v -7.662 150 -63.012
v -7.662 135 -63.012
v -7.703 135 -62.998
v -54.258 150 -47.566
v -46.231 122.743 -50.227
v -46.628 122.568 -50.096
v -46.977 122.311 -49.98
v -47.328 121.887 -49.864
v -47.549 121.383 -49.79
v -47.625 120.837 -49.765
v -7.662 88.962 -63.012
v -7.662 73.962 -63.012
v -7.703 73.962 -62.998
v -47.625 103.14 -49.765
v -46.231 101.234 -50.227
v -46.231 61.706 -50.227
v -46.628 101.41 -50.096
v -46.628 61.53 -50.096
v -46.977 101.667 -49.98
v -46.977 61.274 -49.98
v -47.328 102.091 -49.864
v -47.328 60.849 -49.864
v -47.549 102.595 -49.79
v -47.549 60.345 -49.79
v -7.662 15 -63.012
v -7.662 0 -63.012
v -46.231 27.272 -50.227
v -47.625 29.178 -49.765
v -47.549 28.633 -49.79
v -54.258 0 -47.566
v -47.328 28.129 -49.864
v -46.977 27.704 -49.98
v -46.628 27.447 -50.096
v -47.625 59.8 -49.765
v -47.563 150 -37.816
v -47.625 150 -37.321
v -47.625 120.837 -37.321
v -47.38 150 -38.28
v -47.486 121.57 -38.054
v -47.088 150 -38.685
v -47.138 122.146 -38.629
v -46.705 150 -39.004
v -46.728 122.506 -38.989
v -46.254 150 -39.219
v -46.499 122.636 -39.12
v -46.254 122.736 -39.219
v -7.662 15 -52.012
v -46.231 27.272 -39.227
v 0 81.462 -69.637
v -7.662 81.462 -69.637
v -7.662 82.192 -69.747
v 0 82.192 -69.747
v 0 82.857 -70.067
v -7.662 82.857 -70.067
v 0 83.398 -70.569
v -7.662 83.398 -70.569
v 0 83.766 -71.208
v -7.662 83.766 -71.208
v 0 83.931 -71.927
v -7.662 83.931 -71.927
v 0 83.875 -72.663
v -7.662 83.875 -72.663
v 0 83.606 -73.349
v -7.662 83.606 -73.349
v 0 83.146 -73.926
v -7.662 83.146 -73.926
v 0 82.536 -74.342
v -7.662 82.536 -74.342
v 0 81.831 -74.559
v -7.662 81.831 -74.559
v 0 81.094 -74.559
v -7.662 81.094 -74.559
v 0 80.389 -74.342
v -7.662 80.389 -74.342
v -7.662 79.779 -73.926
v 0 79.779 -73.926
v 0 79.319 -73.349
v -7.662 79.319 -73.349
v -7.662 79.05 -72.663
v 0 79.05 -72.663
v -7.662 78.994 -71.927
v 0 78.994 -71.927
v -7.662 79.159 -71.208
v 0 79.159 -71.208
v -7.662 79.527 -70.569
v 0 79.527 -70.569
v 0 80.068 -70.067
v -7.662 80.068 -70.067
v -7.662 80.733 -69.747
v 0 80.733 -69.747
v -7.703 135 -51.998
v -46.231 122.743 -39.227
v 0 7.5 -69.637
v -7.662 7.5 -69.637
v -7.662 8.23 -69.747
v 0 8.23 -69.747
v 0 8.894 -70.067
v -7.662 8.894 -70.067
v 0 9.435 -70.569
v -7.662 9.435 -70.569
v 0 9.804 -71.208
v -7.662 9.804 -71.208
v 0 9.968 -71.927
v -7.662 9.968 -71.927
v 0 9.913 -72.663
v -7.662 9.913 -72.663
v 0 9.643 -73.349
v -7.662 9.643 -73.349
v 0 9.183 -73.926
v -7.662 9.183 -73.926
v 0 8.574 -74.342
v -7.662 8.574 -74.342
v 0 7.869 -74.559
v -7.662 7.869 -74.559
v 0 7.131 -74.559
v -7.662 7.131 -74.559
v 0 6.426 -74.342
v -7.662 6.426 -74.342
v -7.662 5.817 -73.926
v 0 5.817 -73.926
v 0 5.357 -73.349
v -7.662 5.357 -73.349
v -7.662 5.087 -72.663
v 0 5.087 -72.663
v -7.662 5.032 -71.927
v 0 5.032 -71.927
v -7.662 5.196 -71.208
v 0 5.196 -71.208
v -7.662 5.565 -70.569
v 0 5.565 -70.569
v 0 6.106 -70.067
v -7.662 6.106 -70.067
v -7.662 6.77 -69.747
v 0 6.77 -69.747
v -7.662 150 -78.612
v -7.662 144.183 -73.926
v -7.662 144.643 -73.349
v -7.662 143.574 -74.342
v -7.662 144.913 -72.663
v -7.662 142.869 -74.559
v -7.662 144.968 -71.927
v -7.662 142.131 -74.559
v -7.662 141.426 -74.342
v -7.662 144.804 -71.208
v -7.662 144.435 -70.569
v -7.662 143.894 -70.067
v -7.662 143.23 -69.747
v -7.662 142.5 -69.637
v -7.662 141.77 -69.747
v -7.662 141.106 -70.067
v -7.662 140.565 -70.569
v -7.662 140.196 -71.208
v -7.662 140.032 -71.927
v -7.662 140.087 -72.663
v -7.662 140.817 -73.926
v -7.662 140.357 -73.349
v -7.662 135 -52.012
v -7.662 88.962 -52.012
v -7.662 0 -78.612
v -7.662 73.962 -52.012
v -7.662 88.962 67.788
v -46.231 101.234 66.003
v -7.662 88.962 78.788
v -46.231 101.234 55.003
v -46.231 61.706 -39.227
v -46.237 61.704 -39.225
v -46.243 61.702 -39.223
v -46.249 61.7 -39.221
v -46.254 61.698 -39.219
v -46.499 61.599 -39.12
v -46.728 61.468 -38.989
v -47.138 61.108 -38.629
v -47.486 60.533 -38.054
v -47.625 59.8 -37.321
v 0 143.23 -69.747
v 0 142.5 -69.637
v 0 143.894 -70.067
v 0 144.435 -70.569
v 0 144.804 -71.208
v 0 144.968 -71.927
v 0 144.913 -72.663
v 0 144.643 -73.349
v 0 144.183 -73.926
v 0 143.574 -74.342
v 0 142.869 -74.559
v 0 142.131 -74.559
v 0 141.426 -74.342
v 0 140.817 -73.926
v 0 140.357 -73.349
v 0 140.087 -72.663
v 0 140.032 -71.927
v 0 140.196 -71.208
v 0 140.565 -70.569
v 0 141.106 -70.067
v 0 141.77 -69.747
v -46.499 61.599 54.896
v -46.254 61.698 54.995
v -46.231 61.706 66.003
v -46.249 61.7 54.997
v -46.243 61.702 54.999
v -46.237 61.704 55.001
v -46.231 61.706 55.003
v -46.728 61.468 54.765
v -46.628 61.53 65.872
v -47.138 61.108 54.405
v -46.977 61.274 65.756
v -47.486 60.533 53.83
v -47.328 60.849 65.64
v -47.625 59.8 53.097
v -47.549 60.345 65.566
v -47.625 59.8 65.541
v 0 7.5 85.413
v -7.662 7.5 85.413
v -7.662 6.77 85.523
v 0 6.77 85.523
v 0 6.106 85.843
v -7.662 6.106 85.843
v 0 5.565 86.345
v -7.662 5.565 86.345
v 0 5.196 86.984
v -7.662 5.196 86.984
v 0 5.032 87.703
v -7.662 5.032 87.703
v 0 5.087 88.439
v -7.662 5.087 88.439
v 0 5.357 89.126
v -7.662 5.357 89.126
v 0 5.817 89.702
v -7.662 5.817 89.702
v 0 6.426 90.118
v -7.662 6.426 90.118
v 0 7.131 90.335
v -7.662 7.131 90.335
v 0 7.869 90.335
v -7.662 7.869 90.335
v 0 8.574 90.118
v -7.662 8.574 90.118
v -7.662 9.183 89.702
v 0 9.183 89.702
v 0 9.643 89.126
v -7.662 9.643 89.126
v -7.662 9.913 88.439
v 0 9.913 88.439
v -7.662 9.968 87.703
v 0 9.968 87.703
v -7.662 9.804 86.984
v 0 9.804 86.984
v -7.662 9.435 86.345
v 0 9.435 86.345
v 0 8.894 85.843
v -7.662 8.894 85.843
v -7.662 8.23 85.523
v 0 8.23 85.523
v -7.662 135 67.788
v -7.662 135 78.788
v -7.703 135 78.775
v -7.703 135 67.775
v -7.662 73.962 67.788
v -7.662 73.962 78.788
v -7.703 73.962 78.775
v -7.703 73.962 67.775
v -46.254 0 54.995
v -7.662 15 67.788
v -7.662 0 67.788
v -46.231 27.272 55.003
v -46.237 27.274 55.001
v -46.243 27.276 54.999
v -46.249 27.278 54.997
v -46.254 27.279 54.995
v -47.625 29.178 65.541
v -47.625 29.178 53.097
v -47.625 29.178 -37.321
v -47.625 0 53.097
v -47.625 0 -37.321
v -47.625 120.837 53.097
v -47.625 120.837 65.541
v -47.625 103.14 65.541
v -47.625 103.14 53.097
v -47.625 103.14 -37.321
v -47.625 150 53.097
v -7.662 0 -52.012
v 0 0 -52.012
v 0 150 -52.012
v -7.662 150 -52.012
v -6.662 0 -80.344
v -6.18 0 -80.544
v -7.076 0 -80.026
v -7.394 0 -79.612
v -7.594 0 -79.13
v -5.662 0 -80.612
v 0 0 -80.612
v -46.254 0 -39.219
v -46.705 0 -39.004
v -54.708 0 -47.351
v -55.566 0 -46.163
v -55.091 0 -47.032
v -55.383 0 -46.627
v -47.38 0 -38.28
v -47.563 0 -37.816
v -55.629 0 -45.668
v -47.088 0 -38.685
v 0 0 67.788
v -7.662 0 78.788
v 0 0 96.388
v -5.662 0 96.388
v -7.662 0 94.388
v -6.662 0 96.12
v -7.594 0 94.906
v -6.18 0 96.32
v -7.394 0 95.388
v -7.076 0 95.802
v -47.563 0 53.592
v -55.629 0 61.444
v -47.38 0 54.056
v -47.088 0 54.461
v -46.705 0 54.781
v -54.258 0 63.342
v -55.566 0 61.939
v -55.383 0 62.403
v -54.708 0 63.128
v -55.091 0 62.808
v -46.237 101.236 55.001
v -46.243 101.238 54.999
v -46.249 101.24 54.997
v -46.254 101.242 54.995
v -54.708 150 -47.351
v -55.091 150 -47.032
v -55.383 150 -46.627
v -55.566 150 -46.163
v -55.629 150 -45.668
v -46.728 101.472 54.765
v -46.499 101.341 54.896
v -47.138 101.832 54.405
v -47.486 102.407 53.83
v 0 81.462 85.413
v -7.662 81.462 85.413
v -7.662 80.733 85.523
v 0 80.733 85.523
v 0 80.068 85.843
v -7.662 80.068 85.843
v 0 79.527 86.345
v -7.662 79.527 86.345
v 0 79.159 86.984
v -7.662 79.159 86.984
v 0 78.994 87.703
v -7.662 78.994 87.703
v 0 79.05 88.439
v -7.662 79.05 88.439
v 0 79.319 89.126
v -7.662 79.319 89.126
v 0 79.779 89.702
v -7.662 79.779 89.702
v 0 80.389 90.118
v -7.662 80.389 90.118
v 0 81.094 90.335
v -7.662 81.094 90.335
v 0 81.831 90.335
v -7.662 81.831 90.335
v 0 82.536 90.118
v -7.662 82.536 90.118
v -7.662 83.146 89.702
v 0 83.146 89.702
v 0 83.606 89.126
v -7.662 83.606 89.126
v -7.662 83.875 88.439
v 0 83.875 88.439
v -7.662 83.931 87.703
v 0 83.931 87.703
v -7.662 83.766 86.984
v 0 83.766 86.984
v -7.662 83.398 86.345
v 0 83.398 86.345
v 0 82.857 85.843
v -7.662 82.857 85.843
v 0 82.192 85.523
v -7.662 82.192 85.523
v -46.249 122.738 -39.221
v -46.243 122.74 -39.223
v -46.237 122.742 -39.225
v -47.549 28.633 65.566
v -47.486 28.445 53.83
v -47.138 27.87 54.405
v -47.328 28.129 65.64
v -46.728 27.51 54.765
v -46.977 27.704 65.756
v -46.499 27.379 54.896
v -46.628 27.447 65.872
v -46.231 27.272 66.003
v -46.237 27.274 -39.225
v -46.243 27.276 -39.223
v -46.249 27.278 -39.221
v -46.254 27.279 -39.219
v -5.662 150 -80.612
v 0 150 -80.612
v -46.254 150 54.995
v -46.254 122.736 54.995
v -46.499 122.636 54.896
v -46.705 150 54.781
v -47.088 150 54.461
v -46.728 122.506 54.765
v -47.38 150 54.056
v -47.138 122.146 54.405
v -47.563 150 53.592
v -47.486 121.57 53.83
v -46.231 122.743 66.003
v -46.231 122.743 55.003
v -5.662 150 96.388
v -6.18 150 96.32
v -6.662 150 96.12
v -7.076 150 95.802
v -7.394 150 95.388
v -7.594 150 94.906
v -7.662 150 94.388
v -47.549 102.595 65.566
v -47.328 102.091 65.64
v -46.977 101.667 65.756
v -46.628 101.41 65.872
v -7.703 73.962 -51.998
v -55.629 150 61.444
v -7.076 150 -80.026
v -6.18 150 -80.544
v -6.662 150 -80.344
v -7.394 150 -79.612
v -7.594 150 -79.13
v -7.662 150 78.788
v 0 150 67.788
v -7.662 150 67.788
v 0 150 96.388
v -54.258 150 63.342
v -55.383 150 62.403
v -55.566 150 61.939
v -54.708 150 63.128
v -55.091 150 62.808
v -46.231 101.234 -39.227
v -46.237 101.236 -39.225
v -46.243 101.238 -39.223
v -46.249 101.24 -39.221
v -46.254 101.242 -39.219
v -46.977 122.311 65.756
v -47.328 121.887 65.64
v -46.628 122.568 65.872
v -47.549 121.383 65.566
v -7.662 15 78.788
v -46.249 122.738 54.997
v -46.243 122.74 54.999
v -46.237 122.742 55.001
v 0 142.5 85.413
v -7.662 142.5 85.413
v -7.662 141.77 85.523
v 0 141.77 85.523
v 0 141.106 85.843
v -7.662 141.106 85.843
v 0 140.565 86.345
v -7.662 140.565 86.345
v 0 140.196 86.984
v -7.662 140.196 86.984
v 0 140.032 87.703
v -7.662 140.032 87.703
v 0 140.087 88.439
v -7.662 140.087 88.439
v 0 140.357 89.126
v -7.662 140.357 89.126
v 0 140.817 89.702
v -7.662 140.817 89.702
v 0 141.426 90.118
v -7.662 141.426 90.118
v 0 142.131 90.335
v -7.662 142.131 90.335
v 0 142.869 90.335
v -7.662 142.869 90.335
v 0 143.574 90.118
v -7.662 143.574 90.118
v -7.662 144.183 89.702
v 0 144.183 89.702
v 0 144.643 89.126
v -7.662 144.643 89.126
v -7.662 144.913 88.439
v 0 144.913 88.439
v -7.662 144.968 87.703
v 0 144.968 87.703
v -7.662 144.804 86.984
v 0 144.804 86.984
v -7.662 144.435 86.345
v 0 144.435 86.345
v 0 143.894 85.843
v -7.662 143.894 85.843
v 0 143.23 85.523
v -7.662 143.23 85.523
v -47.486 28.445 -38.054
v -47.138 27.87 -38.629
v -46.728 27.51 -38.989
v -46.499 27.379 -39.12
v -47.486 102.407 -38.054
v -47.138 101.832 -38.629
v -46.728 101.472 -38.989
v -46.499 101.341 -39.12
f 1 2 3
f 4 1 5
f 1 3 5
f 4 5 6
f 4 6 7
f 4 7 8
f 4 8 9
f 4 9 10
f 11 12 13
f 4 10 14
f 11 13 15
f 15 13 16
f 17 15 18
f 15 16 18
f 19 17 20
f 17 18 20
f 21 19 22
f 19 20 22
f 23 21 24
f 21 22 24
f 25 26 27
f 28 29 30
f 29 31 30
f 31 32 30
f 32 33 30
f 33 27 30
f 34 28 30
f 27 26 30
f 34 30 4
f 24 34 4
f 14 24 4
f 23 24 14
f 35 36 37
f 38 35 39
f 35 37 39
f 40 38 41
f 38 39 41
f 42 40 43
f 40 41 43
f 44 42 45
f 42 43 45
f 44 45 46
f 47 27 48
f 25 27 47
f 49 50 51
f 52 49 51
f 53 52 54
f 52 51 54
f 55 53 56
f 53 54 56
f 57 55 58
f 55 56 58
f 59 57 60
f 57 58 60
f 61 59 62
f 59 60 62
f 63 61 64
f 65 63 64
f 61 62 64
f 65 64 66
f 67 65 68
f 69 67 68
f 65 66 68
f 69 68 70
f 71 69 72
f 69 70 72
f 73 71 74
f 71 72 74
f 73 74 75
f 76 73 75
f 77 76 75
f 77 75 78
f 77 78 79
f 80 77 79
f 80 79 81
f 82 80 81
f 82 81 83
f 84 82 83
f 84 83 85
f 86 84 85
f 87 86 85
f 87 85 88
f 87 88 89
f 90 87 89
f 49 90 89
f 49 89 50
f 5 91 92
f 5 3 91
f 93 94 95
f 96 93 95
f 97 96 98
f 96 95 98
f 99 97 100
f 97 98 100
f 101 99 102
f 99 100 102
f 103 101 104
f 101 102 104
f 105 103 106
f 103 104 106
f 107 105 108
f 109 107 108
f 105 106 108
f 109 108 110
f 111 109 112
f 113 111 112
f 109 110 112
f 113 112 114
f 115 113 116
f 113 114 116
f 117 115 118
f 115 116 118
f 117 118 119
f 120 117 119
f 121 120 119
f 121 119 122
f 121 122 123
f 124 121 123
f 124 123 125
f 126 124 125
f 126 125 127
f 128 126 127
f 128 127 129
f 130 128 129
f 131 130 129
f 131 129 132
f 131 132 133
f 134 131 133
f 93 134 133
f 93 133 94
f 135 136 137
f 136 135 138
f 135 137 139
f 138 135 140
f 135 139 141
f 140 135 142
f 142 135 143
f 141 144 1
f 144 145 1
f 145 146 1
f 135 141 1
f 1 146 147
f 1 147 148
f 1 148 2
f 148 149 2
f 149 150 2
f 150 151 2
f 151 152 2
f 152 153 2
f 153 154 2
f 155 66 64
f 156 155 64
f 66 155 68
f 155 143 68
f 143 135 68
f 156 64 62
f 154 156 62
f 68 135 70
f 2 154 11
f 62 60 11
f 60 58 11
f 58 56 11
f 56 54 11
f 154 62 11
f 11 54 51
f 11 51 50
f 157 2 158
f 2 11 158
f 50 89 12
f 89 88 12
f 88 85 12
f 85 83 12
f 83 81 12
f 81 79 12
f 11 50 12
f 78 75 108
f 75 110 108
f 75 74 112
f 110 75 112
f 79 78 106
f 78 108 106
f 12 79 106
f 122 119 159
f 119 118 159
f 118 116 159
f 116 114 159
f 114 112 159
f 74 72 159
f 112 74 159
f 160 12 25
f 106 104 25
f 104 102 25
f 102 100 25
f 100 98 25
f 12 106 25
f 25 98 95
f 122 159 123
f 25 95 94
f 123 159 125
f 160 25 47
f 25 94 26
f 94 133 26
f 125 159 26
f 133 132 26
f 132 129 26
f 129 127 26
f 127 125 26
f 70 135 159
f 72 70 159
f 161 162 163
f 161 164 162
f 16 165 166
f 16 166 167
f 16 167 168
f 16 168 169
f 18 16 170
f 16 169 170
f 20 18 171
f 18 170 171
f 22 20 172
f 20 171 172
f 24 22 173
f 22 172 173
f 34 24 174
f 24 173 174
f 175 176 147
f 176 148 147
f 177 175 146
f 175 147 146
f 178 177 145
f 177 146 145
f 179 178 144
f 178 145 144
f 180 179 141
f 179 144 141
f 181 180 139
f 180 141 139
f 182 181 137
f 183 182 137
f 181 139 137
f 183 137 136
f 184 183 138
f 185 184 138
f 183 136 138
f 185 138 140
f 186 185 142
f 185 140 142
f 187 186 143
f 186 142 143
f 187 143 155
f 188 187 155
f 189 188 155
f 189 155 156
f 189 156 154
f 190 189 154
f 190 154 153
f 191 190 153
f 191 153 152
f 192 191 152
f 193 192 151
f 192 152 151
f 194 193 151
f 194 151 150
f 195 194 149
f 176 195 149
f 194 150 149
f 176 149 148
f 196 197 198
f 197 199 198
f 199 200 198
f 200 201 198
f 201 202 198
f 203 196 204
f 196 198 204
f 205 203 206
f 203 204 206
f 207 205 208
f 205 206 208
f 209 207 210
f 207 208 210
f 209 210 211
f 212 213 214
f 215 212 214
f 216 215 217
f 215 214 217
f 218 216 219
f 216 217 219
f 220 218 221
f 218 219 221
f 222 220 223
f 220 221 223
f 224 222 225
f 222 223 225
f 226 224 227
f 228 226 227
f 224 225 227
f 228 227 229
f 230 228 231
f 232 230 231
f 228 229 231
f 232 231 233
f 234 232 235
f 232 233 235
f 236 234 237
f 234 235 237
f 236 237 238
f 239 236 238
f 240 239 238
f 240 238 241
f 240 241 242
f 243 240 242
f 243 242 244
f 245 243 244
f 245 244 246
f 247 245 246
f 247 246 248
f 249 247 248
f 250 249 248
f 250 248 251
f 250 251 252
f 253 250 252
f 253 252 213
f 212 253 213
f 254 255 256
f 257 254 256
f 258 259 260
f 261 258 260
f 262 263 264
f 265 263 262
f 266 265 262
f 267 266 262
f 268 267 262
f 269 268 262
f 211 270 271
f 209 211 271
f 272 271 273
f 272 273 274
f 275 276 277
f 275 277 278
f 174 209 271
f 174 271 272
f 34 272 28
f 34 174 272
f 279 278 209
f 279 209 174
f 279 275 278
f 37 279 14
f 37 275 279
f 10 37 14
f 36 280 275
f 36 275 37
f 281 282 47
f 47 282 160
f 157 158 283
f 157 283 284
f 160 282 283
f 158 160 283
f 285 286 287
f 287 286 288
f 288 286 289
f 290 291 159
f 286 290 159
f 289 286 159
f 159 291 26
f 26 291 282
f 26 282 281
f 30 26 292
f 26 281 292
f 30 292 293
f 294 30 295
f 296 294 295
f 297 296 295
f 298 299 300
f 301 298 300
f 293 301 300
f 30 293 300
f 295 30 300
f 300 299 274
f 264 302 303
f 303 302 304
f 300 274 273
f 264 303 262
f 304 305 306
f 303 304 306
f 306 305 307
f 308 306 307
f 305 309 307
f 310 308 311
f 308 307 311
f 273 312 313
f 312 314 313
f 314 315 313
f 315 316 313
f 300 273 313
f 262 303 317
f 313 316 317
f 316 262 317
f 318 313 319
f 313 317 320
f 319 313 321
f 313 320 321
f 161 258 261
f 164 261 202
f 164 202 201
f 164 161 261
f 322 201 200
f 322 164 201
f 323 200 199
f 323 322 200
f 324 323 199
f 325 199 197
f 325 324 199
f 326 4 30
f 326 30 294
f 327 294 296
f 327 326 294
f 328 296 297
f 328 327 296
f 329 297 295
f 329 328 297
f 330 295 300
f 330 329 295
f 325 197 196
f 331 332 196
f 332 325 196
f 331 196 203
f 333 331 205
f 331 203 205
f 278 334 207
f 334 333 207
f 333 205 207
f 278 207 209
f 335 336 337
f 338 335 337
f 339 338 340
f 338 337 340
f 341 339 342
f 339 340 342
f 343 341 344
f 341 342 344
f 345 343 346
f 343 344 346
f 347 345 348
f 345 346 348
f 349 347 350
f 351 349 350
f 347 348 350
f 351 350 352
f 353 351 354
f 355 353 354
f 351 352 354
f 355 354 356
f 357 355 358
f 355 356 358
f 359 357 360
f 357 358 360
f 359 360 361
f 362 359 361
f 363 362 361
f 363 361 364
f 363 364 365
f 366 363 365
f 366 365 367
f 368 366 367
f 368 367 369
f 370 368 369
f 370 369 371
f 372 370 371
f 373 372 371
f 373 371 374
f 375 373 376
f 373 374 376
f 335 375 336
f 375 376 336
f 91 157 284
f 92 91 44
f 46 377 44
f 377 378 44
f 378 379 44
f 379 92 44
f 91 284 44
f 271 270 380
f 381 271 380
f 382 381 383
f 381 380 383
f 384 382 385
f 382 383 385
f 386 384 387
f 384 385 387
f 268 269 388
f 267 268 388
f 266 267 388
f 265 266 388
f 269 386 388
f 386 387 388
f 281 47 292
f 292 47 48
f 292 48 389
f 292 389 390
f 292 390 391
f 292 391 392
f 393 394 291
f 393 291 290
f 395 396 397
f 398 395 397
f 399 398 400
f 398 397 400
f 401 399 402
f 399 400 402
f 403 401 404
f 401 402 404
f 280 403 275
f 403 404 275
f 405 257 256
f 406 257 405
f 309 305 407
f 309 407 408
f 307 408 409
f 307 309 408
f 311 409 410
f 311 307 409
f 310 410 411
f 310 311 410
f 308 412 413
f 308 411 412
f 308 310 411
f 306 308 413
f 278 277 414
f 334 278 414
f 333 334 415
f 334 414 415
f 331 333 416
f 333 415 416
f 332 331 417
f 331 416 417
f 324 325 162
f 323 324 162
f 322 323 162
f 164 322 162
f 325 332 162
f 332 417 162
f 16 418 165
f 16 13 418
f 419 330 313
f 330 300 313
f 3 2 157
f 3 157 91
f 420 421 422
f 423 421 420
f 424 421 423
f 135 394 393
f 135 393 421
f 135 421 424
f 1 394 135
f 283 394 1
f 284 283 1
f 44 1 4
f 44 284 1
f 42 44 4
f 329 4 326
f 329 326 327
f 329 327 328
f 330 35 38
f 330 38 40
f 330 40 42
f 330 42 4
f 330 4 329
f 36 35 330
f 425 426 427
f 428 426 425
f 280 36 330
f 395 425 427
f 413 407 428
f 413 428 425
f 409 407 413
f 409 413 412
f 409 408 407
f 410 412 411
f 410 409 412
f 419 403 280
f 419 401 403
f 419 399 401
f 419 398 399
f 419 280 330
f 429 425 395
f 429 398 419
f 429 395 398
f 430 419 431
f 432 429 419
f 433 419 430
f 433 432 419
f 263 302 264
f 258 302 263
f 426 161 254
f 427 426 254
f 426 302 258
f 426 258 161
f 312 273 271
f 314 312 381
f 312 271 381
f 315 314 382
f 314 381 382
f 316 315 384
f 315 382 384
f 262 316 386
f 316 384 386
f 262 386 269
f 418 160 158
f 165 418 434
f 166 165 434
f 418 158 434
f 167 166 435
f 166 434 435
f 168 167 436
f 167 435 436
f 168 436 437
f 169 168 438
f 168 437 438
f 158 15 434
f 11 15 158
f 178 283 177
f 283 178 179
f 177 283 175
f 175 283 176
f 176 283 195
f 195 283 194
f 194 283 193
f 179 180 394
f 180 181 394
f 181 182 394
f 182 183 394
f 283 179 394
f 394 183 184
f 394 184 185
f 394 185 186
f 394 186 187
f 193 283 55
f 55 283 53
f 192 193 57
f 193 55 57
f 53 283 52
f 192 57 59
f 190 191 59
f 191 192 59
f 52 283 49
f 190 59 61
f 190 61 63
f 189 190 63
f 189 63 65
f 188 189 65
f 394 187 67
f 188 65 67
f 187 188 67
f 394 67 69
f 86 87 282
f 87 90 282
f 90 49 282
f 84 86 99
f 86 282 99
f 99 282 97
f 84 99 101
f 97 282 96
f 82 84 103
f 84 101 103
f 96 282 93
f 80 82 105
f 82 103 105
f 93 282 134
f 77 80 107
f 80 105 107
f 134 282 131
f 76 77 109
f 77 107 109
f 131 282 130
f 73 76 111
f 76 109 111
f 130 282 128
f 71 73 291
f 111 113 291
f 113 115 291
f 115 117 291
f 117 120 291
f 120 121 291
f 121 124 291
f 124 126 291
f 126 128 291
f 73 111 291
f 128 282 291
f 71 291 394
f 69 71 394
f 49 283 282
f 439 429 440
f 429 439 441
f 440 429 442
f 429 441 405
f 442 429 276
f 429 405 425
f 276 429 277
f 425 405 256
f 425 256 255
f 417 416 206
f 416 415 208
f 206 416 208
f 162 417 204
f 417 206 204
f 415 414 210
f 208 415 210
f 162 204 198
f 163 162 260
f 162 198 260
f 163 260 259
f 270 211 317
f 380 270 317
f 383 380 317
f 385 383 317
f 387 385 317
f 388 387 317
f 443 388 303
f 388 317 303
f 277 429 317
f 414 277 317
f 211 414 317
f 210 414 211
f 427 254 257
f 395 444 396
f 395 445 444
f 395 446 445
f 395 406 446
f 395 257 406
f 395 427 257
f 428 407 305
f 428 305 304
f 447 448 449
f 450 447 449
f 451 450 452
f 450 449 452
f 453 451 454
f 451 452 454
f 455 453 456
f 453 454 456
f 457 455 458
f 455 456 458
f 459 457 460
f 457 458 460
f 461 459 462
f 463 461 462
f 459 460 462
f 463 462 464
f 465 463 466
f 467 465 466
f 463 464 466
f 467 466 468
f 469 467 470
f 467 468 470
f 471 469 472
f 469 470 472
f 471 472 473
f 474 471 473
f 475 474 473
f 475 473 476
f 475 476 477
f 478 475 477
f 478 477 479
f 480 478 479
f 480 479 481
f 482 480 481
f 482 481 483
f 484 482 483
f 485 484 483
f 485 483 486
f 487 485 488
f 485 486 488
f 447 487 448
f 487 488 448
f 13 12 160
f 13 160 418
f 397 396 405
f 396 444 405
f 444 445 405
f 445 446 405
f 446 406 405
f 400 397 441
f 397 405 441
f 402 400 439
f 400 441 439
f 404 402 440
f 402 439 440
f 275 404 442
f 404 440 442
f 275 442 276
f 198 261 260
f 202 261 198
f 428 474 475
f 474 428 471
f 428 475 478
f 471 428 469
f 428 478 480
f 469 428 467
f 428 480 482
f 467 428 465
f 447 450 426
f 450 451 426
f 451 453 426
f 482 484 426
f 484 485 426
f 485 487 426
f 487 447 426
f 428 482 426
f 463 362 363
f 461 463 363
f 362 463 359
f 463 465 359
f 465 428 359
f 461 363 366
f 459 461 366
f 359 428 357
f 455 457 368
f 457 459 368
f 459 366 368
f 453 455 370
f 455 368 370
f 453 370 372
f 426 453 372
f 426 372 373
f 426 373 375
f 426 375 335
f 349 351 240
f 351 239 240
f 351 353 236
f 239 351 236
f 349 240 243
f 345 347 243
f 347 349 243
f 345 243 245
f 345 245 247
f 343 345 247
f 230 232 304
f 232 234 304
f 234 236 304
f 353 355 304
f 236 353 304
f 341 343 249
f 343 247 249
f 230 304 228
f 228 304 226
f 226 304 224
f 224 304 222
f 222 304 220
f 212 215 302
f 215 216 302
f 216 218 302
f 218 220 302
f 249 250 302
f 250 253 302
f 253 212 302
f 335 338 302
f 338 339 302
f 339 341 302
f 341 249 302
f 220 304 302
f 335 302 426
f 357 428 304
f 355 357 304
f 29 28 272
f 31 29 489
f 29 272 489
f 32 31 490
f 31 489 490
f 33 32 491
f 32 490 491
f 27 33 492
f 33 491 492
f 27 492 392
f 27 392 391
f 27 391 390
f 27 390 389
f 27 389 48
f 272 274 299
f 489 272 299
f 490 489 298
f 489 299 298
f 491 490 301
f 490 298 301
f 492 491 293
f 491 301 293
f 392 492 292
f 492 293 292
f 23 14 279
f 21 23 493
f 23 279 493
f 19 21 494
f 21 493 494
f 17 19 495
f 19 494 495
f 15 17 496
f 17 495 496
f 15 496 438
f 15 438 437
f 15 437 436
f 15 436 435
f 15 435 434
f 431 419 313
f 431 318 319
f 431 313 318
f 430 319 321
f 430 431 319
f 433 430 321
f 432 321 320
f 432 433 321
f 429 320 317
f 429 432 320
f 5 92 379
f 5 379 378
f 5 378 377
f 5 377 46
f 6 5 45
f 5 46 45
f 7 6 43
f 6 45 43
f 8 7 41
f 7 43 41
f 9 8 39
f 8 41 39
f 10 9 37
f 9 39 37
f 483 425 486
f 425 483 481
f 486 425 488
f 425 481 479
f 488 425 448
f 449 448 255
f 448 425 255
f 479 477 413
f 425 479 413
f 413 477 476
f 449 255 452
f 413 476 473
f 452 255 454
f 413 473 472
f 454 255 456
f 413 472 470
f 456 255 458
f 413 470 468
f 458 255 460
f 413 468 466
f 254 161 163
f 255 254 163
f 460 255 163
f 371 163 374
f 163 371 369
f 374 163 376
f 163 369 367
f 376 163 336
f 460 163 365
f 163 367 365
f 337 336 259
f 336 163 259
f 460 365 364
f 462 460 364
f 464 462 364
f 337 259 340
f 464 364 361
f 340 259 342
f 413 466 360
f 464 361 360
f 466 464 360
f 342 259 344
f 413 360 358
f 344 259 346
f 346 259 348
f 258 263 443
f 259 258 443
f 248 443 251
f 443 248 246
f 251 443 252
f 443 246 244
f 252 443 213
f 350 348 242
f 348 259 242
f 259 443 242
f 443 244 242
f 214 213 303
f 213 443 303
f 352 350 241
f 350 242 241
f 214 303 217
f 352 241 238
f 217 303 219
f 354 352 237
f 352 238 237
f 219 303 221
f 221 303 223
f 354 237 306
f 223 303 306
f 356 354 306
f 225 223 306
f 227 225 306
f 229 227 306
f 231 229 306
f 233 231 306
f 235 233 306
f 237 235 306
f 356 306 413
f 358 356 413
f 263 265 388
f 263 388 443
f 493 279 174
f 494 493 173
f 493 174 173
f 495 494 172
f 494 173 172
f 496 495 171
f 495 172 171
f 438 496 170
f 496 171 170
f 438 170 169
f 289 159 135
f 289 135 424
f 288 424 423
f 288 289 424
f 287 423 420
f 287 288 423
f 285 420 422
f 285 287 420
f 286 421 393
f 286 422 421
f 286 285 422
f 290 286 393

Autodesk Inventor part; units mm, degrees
ref_plane "YZ Plane" through (0, 0, 0) normal (1, 0, 0) x (0, 1, 0)
ref_plane "XZ Plane" through (0, 0, 0) normal (0, 1, 0) x (-1, 0, 0)
ref_plane "XY Plane" through (0, 0, 0) normal (0, 0, 1) x (1, 0, 0)
sketch "Sketch1" plane through (0, 0, 0) normal (0, 1, 0) x (-1, 0, 0)
  line L0 (0, 96.3881) -> (0, -80.6119)
  line L1 (0, -80.6119) -> (7.6619, -80.6119)
  line L2 (7.6619, -80.6119) -> (7.6619, -63.0119)
  line L3 (7.6619, -63.0119) -> (55.6286, -47.1119)
  line L4 (55.6286, -47.1119) -> (55.6286, 62.8881)
  line L5 (55.6286, 62.8881) -> (7.6619, 78.7881)
  line L6 (7.6619, 78.7881) -> (7.6619, 96.3881)
  line L7 (7.6619, 96.3881) -> (0, 96.3881)
  point P0 (0, 0)
  dimension "d0" = 177
  dimension "d1" = 17.6
  dimension "d2" = 17.6
  dimension "d3" = 110
  dimension "d4" = 15.9
extrude "Extrusion1" add sketch "Sketch1" along normal blind 150
sketch "Sketch2" plane through (0, 150, 0) normal (0, 1, 0) x (1, 0, 0)
  line L0 (-7.6619, -78.7881) -> (-7.6619, -96.3881) projected
  line L1 (-7.6619, -78.7881) -> (0, -78.7881)
  line L2 (0, -96.3881) -> (0, 80.6119) projected
  line L3 (0, -78.7881) -> (0, -67.7881)
  line L4 (0, -67.7881) -> (-7.6619, -67.7881)
  line L5 (-7.6619, 80.6119) -> (-7.6619, 63.0119) projected
  line L6 (-7.6619, 63.0119) -> (0, 63.0119)
  line L7 (0, 63.0119) -> (0, 52.0119)
  line L8 (0, 52.0119) -> (-7.6619, 52.0119)
  line L9 (0, -67.7881) -> (0, 52.0119)
  line L10 (-7.6619, -67.7881) -> (-47.625, -54.5411)
  line L11 (-7.6619, 52.0119) -> (-47.625, 38.7649)
  line L12 (-55.6286, -62.8881) -> (-7.6619, -78.7881) projected
  line L13 (-7.6619, 63.0119) -> (-55.6286, 47.1119) projected
  line L14 (-47.625, -54.5411) -> (-47.625, 38.7649)
  point P0 (0, 0)
  dimension "d8" = 11
  dimension "d9" = 11
  dimension "d10" = 0
  dimension "d11" = 0
  dimension "d12" = 93.306
extrude "Extrusion2" cut sketch "Sketch2" against normal blind 150
sketch "Sketch3" plane through (0, 0, -80.6119) normal (0, 0, -1) x (-1, 0, 0)
  line L0 (0, 0) -> (0, 150) projected
  line L1 (0, 135) -> (7.7027, 135)
  line L2 (7.7027, 135) -> (47.625, 122.3)
  line L3 (47.625, 150) -> (47.625, 0) projected
  line L4 (47.625, 122.3) -> (47.625, 101.6779)
  line L5 (47.625, 101.6779) -> (7.6619, 88.9625)
  line L6 (7.6619, 150) -> (7.6619, 0) projected
  line L7 (7.6619, 88.9625) -> (0, 88.9625)
  line L8 (0, 135) -> (0, 88.9625)
  line L9 (0, 73.9625) -> (7.7027, 73.9625)
  line L10 (7.7027, 73.9625) -> (47.625, 61.2625)
  line L11 (47.625, 61.2625) -> (47.625, 27.7154)
  line L12 (47.625, 27.7154) -> (7.6619, 15)
  line L13 (7.6619, 15) -> (0, 15)
  line L14 (0, 73.9625) -> (0, 15)
  line L15 (0, 150) -> (7.6619, 150) projected
  line L16 (0, 0) -> (7.6619, 0) projected
  point P0 (7.6619, 15)
  point P1 (7.6619, 73.9625)
  point P2 (7.6619, 135)
  dimension "d15" = 72.35
  dimension "d16" = 72.353
  dimension "d18" = 15
  dimension "d19" = 15
  dimension "d20" = 46.0375
  dimension "d22" = 72.353
  dimension "d23" = 72.35
  dimension "d24" = 15
extrude "Extrusion3" cut sketch "Sketch3" against normal blind 1500 contours L6 L9 L10 L3 L12 | L6 L1 L2 L3 L5
fillet "Fillet1" radius 2 8 edges at (-47.625, 122.3, -44.2649) (-47.625, 101.6779, -44.2649) (-47.625, 61.2625, -44.2649) (-47.625, 27.7154, -44.2649) (-47.625, 61.2625, 60.0411) (-47.625, 122.3, 60.0411) (-47.625, 101.6779, 60.0411) (-47.625, 27.7154, 60.0411)
fillet "Fillet2" radius 2 12 edges at (-47.625, 121.5687, 54.5411) (-47.625, 136.15, 54.5411) (-47.625, 60.5312, 54.5411) (-47.625, 102.4092, 54.5411) (-47.625, 28.4467, 54.5411) (-47.625, 13.8577, 54.5411) (-47.625, 136.15, -38.7649) (-47.625, 121.5687, -38.7649) (-47.625, 60.5312, -38.7649) (-47.625, 102.4092, -38.7649) (-47.625, 13.8577, -38.7649) (-47.625, 28.4467, -38.7649)
fillet "Fillet3" radius 2 4 edges at (-7.6619, 75, 96.3881) (-7.6619, 75, -80.6119) (-55.6286, 75, -47.1119) (-55.6286, 75, 62.8881)
sketch "Sketch4" plane through (-7.6619, 15, -52.0119) normal (-1, 0, 0) x (0, 0, 1)
  line L0 (130.8, 135) -> (146.4, 135) projected
  line L1 (139.9, 135) -> (139.9, -14.5366)
  line L2 (-20.1, 135) -> (-20.1, -15)
  line L3 (-26.6, -15) -> (-26.6, 135) projected
  line L4 (-26.6, -15) -> (-11, -15) projected
  line L5 (148.4, -15) -> (148.4, 135) projected
  circle A0 centre (-20.1, 127.5) radius 2.475
  line L6 (-26.6, 135) -> (-11, 135) projected
  circle A1 centre (-20.1, 66.4625) radius 2.475
  circle A2 centre (-20.1, -7.5) radius 2.475
  line L7 (-10.9865, 58.9625) -> (0.0135, 58.9625) projected
  point P0 (52.0119, -15)
  dimension "d30" = 160
  dimension "d31" = 150
  dimension "d32" = 0
  dimension "d33" = 8.5
  dimension "d34" = 4.95
  dimension "d35" = 7.5
  dimension "d36" = 7.5
  dimension "d37" = 7.5
extrude "Extrusion4" cut sketch "Sketch4" against normal blind 1500 contours A0 L2 | L2 A0 | A1 L2 | L2 A1 | A2 L2 | L2 A2
ref_plane "Work Plane1" through (-221.551, 135, 7.8881) normal (0, 0, -1) x (0, -1, 0)
mirror "Mirror1" about plane through (-221.551, 135, 7.8881) normal (0, 0, -1) of "Extrusion4"
properties part number "SpotAttachment"
